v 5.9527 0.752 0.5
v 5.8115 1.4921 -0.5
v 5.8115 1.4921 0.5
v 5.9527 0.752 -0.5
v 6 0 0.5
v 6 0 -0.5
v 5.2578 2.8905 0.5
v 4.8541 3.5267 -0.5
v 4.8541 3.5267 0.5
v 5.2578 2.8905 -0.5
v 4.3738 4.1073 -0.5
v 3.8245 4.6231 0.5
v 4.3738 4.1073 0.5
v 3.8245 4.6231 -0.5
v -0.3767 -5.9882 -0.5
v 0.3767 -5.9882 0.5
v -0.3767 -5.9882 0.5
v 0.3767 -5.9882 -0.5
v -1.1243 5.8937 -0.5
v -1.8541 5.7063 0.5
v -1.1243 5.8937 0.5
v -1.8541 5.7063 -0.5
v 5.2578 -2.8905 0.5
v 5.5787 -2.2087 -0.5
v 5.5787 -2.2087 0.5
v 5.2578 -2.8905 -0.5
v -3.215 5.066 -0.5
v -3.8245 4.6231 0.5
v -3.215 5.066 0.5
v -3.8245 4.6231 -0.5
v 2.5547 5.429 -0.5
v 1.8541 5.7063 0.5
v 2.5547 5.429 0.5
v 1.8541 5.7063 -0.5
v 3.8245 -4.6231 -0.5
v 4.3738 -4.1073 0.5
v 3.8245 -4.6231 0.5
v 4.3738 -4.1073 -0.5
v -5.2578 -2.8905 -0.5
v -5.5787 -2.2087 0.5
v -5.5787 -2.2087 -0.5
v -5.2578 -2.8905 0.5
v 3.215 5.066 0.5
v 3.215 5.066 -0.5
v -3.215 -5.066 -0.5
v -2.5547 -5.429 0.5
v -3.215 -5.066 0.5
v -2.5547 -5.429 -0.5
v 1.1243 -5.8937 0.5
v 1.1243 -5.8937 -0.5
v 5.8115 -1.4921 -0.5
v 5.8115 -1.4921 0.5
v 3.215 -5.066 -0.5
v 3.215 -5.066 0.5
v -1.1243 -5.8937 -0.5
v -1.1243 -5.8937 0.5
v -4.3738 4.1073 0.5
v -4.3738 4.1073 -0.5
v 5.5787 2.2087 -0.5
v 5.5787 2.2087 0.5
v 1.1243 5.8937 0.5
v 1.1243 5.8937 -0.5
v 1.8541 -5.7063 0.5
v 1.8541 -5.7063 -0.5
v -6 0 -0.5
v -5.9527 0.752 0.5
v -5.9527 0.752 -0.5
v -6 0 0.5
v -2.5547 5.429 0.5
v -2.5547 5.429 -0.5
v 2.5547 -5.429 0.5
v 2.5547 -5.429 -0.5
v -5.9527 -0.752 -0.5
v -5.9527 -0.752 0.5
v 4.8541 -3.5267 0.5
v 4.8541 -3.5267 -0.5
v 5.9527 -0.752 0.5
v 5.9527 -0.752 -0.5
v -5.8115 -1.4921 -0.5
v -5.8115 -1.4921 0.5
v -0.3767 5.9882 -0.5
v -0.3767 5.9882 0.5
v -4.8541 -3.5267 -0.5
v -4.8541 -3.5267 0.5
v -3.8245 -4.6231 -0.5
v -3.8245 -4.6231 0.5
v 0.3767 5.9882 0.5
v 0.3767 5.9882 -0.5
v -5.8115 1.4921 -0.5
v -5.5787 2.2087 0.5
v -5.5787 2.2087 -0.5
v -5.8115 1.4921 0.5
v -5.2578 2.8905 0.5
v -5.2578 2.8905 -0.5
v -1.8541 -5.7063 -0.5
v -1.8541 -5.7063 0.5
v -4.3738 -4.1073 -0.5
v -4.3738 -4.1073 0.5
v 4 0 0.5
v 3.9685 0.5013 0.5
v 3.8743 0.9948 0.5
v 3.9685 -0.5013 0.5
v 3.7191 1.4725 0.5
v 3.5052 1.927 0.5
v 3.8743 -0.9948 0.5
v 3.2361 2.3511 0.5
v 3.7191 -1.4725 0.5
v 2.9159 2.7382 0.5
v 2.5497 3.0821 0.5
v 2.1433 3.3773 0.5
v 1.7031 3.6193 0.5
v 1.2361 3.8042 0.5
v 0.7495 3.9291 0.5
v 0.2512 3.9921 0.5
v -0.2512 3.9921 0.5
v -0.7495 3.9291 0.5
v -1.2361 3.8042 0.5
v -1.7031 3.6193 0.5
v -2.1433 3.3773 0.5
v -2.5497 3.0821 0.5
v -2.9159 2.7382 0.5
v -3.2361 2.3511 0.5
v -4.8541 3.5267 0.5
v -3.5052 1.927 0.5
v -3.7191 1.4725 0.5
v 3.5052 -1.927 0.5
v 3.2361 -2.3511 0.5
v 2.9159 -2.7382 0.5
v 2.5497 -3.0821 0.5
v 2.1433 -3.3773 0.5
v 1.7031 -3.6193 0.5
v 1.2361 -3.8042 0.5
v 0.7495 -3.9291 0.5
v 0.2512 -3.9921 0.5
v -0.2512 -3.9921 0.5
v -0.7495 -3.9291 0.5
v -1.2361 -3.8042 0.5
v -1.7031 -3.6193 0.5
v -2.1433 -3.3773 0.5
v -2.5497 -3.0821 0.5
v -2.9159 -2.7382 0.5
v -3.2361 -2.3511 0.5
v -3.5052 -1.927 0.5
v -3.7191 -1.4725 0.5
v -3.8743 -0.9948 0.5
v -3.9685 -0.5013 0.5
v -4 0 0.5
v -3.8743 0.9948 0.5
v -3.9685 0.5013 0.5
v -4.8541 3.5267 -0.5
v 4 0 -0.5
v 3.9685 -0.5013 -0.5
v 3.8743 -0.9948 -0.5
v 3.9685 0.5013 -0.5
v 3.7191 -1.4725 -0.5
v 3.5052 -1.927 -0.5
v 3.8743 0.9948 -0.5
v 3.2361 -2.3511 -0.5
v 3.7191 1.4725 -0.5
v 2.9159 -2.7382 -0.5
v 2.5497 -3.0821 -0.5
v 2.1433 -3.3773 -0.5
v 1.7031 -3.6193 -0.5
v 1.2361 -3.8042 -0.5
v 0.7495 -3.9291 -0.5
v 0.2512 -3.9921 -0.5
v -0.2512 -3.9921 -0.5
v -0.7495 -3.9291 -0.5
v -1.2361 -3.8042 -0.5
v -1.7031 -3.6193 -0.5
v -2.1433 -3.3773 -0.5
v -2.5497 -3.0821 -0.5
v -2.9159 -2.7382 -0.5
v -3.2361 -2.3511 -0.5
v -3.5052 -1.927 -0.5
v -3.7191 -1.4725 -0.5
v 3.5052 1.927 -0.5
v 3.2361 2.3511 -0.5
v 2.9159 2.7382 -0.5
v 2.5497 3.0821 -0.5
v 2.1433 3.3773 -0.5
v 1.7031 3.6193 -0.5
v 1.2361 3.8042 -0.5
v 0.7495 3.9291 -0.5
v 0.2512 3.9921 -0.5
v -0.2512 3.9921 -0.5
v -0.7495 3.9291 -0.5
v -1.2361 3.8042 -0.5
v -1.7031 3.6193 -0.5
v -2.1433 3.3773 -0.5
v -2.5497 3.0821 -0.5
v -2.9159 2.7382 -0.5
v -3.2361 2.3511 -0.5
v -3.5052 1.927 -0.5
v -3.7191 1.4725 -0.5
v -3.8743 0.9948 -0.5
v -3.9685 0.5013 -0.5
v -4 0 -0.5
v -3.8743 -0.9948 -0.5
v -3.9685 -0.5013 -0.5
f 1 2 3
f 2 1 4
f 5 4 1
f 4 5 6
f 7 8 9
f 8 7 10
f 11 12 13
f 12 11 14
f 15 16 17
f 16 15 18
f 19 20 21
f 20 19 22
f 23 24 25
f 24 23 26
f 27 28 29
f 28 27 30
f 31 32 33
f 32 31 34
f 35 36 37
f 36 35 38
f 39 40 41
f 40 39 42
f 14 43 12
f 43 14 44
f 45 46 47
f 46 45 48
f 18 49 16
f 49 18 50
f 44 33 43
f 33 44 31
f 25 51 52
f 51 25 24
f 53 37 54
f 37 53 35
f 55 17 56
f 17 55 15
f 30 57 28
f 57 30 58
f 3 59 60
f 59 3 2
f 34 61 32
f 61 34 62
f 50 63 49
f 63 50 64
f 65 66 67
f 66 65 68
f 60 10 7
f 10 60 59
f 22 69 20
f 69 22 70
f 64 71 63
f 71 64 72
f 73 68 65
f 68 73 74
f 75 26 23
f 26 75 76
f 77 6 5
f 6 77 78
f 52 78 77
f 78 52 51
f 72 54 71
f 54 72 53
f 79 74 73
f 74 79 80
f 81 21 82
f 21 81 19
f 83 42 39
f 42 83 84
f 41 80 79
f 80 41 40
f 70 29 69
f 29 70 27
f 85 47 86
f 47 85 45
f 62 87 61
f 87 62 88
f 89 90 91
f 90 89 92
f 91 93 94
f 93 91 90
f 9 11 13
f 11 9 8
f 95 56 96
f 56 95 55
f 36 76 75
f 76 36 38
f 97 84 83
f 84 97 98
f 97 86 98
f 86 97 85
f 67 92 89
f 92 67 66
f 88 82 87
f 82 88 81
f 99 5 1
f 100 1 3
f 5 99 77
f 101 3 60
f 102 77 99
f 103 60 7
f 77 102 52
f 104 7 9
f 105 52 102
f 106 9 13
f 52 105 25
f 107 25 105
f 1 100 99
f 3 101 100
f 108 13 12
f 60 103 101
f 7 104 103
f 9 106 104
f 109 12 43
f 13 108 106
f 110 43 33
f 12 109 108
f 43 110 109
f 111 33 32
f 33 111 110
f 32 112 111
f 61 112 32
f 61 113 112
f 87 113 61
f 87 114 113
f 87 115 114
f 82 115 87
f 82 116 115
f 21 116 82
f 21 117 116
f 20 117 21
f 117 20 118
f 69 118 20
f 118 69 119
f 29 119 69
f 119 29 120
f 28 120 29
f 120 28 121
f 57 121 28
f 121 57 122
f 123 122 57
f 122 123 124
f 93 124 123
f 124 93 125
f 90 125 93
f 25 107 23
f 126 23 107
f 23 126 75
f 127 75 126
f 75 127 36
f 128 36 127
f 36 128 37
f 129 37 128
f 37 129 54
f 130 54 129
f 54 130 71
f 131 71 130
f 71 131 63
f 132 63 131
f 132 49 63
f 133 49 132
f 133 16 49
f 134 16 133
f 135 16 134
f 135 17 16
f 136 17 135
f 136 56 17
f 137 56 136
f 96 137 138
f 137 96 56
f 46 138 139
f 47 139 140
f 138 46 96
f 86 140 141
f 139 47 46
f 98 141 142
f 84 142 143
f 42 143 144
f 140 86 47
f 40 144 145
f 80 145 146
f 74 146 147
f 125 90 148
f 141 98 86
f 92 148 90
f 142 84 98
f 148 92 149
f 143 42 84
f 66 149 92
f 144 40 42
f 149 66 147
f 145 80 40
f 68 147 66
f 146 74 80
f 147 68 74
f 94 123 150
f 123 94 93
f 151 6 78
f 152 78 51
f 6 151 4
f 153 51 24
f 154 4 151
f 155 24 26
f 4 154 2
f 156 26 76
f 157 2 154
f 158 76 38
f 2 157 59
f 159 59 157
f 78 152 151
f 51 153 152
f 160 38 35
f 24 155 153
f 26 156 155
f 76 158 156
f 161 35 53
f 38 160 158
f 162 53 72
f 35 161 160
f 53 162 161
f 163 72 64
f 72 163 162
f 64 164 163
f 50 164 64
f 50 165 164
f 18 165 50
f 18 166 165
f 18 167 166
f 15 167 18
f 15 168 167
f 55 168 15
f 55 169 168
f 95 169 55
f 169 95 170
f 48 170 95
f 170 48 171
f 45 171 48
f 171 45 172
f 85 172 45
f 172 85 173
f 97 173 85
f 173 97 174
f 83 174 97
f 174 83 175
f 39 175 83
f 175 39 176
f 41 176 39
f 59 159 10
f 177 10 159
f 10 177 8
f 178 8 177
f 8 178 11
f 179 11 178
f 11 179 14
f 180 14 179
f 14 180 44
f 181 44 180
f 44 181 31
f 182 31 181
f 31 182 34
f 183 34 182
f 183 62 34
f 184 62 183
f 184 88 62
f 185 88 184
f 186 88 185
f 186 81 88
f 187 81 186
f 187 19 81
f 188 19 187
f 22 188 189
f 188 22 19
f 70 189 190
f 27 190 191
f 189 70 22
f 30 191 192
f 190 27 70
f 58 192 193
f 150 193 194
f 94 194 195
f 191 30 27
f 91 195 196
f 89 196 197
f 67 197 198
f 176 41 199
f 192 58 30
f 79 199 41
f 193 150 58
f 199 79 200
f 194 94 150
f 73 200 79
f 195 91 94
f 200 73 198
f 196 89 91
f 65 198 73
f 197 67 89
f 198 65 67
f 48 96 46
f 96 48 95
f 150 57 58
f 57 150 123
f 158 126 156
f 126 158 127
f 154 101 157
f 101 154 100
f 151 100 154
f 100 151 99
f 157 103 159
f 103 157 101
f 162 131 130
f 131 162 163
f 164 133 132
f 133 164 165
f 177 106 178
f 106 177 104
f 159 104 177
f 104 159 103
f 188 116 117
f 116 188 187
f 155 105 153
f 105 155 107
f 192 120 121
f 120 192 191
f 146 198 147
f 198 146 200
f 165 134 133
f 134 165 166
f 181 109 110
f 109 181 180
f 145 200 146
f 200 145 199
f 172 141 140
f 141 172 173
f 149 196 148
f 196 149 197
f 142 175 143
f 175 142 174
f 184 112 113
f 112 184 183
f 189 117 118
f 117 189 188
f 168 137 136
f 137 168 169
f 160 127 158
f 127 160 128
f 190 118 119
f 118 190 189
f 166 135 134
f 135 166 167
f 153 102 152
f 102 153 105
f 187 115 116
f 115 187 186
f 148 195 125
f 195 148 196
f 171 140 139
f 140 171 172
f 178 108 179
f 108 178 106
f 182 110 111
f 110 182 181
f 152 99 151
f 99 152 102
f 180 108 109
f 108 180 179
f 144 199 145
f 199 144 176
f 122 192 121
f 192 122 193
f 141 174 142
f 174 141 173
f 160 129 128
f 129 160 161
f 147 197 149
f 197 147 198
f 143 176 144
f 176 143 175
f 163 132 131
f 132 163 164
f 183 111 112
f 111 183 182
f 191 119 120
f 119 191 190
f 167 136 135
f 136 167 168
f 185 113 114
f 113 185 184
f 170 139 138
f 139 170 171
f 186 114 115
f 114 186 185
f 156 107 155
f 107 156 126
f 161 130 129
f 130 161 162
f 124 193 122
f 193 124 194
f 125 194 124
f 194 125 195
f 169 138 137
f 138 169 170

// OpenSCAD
$fn = 50;


difference() {
	union() {
		translate(v = [0, 0, -0.5000000000]) {
			cylinder(h = 1, r = 6.0000000000);
		}
	}
	union() {
		translate(v = [0, 0, -100.0000000000]) {
			cylinder(h = 200, r = 4.0000000000);
		}
	}
}
